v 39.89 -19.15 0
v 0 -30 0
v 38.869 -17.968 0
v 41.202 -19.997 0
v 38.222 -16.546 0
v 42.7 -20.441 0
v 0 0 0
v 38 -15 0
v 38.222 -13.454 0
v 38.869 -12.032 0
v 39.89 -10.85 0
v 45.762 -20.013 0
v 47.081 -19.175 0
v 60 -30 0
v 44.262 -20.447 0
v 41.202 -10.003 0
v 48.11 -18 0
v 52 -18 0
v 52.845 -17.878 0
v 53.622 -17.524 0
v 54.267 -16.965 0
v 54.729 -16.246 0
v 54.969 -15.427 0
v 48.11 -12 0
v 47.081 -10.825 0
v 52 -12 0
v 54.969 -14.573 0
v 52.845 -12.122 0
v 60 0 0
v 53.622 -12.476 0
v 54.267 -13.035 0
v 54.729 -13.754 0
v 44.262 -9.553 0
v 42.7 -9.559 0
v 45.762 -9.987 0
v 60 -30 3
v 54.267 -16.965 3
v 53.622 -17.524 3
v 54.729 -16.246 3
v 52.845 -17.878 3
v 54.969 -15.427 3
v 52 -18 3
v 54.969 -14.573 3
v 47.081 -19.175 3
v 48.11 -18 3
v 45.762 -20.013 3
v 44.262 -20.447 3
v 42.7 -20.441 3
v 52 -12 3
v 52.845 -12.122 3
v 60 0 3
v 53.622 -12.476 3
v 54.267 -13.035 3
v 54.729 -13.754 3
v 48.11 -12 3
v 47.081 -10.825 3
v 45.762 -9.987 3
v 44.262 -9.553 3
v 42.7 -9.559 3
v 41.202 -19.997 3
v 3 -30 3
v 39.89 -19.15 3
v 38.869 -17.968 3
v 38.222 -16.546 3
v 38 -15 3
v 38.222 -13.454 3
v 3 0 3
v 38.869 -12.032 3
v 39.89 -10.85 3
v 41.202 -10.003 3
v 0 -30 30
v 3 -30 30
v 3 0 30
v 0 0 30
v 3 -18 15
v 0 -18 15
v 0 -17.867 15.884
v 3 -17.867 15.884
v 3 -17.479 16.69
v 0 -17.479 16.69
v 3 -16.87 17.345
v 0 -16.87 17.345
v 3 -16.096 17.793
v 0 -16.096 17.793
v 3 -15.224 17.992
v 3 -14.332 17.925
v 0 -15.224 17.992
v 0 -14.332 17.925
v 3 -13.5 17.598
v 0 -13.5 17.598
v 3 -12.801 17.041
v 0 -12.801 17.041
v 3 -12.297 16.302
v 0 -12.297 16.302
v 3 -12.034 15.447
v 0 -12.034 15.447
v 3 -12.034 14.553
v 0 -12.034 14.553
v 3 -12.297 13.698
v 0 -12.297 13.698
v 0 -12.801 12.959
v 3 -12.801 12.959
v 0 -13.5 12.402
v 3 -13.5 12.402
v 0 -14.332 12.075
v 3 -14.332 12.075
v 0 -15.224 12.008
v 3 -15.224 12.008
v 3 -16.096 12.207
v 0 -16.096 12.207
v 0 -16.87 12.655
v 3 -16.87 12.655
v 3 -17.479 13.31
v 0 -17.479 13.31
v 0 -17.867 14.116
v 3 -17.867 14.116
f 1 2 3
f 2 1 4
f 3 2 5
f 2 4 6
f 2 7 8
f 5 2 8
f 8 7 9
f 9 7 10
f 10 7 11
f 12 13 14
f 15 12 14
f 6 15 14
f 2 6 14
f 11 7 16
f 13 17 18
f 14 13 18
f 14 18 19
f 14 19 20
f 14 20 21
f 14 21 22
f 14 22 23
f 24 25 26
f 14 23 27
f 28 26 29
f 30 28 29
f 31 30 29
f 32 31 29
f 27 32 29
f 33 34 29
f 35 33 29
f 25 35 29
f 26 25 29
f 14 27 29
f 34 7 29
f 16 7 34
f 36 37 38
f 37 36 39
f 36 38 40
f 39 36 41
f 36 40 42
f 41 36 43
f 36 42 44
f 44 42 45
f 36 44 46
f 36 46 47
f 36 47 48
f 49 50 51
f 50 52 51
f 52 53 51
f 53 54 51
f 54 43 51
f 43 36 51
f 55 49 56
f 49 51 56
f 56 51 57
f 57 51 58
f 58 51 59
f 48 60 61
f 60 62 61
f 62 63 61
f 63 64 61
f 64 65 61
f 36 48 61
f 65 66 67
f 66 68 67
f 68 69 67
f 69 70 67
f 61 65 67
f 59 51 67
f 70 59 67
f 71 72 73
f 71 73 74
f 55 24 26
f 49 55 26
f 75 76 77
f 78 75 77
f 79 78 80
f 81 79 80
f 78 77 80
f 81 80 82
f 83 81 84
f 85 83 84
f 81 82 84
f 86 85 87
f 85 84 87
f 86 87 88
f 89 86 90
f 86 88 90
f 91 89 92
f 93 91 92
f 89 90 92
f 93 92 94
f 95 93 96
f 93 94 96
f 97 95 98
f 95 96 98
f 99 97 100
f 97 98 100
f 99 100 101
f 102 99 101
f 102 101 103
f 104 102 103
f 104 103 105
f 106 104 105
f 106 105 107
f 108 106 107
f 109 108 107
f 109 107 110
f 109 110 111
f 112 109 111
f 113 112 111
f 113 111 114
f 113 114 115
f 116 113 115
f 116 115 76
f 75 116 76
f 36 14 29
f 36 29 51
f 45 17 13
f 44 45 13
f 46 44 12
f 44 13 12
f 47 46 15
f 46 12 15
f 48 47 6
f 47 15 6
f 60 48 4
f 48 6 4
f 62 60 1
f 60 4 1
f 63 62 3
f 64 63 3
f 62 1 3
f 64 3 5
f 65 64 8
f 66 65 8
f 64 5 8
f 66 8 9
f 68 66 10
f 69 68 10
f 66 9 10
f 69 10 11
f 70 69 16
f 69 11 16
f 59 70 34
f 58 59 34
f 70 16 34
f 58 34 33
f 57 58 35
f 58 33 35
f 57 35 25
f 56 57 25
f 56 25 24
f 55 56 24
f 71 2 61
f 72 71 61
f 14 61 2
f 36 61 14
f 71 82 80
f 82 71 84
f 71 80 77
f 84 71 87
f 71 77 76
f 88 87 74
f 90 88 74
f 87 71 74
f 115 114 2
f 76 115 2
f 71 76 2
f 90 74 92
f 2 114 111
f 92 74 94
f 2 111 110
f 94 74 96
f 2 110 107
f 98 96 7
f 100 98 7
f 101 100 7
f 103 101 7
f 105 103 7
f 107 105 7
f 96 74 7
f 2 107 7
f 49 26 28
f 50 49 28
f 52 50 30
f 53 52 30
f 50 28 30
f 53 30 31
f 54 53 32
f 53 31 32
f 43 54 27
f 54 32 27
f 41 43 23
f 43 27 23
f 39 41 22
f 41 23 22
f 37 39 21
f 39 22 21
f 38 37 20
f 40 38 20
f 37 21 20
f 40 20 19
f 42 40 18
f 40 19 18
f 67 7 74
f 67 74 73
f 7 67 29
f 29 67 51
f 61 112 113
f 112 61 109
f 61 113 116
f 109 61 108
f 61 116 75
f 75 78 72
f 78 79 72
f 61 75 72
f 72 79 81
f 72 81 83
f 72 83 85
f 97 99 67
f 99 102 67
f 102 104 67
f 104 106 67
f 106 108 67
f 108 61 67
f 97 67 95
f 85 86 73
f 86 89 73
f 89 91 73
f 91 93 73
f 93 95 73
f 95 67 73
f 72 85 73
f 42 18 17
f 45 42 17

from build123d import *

# Parameters (mm, degrees)
F1_DEPTH = 30
F2_R     = 3
F3_DEPTH = 60.001
F5_DEPTH = 30.001


with BuildPart() as f1:
    # F0 (on Front) → F1 (new body)
    with BuildSketch(Plane.XZ):
        Polygon((0, 30), (0, 0), (60, 0), (60, 3), (3, 3), (3, 30), align=None)
    extrude(amount=F1_DEPTH)

    # F2 (on face) → F3 (cut, through all)
    with BuildSketch(Plane(origin=(0, 0, 0), x_dir=(0, -1, 0), z_dir=(-1, 0, 0))):
        with Locations((15, 15)):
            Circle(F2_R)
    extrude(amount=-F3_DEPTH, mode=Mode.SUBTRACT)

    # F4 (on face) → F5 (cut, through all)
    with BuildSketch(Plane(origin=(0, 0, 0), x_dir=(1, 0, 0), z_dir=(0, 0, -1))):
        with BuildLine():
            Line((52, 18), (48.109772, 18))
            ThreePointArc((48.109772, 18), (38, 15), (48.109772, 12))
            Line((48.109772, 12), (52, 12))
            ThreePointArc((52, 12), (55, 15), (52, 18))
        make_face()
    extrude(amount=-F5_DEPTH, mode=Mode.SUBTRACT)


solid = f1.part
